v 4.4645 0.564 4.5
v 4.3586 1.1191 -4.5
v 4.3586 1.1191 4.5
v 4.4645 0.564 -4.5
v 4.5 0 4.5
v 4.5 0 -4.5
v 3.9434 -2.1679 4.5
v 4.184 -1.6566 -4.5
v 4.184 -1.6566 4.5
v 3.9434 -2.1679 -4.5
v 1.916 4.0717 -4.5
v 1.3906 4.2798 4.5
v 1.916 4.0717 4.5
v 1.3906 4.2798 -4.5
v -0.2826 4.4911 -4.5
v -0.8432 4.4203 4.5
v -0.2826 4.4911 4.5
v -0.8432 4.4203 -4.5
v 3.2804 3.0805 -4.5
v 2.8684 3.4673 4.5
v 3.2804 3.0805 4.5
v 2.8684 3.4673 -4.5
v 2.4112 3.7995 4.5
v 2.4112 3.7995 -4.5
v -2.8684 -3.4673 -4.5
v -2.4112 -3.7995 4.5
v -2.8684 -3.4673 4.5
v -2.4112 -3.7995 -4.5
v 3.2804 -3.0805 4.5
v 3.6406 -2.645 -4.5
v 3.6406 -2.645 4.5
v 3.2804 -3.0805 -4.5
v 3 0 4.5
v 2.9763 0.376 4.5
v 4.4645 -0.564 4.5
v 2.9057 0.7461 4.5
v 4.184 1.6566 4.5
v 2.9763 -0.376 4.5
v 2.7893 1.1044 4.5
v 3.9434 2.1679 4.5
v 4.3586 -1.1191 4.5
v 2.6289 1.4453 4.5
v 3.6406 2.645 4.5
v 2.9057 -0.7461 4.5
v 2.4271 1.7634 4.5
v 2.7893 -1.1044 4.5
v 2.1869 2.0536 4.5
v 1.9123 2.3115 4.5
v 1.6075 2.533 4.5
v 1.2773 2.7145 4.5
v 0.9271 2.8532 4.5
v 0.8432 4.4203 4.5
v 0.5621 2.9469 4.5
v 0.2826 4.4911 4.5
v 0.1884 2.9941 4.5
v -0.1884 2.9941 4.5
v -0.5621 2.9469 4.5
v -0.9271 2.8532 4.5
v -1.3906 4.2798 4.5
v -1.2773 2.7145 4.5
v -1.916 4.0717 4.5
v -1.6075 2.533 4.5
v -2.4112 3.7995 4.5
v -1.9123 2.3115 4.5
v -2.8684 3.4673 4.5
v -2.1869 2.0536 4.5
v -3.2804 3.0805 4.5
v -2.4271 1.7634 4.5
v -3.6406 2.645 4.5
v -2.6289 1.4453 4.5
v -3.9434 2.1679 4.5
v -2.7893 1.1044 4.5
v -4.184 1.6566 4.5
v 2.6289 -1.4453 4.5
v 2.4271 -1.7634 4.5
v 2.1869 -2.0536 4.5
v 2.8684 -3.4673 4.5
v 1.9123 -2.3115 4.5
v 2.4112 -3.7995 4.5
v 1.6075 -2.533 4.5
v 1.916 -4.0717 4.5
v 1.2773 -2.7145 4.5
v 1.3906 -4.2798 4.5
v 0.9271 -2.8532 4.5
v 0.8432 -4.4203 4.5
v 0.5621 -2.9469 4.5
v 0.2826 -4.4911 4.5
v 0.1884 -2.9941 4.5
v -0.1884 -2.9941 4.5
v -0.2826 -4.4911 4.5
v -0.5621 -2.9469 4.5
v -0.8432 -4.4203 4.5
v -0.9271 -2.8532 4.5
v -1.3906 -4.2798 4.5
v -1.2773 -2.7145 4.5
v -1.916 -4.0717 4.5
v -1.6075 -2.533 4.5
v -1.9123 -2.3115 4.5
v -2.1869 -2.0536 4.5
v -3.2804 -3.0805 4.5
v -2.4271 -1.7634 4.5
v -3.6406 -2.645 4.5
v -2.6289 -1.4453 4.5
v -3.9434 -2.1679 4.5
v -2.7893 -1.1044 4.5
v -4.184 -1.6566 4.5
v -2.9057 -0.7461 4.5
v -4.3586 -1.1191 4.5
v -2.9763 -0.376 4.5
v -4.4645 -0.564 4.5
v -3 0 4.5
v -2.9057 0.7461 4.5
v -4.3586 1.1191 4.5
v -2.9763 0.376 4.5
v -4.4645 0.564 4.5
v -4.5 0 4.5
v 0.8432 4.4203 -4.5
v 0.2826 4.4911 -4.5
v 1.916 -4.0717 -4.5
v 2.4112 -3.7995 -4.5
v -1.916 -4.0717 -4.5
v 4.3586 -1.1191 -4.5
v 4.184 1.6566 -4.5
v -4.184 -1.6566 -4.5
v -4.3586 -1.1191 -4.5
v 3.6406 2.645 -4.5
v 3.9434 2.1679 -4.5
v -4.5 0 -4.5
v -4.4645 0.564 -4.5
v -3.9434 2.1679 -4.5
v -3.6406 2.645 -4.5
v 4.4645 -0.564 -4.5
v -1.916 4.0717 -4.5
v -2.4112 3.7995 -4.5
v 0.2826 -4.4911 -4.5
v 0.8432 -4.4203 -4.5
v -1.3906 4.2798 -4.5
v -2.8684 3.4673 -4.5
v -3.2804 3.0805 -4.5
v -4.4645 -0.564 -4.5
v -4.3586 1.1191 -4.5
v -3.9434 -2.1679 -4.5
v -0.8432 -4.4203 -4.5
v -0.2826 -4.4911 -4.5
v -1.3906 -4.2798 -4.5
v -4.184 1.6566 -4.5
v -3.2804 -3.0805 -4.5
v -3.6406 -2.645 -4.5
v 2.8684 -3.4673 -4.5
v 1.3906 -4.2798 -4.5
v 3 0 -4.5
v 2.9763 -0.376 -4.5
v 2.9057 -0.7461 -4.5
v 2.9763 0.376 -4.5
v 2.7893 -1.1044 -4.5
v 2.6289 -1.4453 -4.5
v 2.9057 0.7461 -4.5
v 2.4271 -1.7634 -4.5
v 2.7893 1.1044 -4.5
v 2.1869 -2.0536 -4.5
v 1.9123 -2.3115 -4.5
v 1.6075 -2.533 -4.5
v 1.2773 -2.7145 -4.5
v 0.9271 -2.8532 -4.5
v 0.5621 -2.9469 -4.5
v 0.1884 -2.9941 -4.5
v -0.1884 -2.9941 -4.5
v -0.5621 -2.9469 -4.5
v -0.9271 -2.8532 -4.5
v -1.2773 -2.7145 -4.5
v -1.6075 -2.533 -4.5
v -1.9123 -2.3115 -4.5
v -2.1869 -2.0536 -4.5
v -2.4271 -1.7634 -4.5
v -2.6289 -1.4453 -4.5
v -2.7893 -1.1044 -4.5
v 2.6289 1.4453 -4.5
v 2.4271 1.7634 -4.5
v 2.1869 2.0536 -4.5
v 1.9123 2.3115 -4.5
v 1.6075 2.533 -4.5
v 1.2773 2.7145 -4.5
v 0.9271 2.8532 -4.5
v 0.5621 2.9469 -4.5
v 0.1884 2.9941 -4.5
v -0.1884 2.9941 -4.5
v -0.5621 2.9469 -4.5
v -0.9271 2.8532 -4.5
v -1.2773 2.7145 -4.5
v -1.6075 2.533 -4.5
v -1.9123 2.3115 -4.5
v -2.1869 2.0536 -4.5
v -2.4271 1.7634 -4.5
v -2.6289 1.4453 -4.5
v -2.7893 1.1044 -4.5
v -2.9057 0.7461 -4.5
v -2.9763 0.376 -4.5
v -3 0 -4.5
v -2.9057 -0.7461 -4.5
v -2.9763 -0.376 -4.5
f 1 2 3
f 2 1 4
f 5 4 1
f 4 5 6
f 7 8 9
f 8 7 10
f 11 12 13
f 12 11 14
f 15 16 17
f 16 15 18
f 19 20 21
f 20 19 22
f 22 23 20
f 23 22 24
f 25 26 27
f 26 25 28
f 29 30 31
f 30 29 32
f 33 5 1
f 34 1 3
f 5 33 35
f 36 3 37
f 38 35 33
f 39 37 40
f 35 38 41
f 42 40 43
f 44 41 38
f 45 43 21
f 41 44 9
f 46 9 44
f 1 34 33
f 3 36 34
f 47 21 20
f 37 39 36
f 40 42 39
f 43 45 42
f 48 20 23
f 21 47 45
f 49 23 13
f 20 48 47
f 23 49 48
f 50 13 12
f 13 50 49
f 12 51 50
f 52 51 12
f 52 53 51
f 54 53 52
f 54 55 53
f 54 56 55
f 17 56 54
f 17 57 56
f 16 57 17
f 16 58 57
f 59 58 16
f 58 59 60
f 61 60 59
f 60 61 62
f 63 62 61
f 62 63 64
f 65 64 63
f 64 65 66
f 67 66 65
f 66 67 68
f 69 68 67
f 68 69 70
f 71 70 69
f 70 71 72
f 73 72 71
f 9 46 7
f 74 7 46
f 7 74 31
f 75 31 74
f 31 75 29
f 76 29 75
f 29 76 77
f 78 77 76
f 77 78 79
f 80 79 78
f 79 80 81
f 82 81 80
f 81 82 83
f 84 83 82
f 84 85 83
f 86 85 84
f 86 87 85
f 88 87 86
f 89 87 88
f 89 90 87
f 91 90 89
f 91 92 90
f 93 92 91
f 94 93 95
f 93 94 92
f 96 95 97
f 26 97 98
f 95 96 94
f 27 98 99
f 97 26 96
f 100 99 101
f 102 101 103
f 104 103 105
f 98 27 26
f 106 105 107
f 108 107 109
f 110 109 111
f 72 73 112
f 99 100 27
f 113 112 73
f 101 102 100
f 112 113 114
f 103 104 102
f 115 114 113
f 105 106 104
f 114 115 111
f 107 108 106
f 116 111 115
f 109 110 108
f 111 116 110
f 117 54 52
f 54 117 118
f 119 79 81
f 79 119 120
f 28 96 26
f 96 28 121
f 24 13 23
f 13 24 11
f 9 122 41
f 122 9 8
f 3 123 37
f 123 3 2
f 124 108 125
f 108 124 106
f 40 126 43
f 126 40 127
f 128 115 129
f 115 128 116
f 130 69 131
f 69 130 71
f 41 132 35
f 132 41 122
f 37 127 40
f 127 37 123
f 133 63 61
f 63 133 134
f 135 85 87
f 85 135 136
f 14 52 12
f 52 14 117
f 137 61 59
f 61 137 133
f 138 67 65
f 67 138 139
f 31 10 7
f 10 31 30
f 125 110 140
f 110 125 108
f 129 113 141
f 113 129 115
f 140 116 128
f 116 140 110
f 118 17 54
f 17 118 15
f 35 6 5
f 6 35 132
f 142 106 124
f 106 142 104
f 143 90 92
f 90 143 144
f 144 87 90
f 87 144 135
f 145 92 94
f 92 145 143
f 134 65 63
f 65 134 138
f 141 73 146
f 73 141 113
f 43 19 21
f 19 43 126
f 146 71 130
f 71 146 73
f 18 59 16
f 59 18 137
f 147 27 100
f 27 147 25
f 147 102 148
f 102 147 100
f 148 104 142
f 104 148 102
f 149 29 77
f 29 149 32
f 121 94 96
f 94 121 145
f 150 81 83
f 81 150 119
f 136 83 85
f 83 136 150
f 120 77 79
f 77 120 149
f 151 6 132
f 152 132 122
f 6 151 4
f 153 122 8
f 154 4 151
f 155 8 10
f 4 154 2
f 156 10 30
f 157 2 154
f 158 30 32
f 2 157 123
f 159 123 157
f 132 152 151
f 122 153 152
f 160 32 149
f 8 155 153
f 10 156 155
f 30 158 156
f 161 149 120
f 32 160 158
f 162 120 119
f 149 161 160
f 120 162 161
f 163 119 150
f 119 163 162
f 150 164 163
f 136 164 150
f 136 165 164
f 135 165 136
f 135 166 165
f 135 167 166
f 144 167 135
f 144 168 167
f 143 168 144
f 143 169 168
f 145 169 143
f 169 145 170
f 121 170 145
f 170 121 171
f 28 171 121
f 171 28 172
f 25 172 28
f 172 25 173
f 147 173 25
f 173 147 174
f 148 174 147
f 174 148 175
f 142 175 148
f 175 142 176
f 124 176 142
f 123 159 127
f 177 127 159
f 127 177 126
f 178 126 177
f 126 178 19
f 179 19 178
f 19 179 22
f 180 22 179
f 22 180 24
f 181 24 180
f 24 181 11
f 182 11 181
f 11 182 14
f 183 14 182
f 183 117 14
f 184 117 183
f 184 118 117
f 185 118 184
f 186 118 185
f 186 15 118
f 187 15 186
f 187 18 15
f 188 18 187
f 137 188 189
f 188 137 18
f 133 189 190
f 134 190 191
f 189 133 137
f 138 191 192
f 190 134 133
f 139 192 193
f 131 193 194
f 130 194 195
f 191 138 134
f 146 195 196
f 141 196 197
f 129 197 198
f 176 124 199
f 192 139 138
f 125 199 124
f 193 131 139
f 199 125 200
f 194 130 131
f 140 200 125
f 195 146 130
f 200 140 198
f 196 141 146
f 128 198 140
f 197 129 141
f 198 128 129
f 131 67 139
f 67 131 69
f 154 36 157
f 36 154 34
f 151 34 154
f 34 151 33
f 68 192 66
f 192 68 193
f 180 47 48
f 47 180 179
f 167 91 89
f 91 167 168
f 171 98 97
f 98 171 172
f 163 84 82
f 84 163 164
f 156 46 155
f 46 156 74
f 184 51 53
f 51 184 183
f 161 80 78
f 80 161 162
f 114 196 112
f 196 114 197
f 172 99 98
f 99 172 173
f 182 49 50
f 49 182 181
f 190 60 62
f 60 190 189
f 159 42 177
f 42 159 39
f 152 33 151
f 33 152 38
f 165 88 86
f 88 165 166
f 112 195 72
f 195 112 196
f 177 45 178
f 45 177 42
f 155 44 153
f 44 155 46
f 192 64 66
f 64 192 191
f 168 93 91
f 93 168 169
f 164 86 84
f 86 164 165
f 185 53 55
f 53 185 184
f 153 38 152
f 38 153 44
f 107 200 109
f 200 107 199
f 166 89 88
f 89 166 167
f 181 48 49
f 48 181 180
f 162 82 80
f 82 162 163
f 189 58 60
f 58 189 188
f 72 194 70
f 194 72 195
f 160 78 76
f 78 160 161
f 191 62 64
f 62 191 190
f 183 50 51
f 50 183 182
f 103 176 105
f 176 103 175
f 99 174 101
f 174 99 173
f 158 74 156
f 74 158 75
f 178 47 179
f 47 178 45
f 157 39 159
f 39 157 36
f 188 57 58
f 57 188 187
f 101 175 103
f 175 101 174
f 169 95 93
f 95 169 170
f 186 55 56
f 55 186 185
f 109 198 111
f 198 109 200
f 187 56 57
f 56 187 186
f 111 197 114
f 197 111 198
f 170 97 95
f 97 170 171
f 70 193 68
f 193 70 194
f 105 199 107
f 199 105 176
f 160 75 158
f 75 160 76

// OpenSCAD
$fn = 50;


difference() {
	union() {
		translate(v = [0, 0, -4.5000000000]) {
			cylinder(h = 9, r = 4.5000000000);
		}
	}
	union() {
		translate(v = [0, 0, -100.0000000000]) {
			cylinder(h = 200, r = 3.0000000000);
		}
	}
}
